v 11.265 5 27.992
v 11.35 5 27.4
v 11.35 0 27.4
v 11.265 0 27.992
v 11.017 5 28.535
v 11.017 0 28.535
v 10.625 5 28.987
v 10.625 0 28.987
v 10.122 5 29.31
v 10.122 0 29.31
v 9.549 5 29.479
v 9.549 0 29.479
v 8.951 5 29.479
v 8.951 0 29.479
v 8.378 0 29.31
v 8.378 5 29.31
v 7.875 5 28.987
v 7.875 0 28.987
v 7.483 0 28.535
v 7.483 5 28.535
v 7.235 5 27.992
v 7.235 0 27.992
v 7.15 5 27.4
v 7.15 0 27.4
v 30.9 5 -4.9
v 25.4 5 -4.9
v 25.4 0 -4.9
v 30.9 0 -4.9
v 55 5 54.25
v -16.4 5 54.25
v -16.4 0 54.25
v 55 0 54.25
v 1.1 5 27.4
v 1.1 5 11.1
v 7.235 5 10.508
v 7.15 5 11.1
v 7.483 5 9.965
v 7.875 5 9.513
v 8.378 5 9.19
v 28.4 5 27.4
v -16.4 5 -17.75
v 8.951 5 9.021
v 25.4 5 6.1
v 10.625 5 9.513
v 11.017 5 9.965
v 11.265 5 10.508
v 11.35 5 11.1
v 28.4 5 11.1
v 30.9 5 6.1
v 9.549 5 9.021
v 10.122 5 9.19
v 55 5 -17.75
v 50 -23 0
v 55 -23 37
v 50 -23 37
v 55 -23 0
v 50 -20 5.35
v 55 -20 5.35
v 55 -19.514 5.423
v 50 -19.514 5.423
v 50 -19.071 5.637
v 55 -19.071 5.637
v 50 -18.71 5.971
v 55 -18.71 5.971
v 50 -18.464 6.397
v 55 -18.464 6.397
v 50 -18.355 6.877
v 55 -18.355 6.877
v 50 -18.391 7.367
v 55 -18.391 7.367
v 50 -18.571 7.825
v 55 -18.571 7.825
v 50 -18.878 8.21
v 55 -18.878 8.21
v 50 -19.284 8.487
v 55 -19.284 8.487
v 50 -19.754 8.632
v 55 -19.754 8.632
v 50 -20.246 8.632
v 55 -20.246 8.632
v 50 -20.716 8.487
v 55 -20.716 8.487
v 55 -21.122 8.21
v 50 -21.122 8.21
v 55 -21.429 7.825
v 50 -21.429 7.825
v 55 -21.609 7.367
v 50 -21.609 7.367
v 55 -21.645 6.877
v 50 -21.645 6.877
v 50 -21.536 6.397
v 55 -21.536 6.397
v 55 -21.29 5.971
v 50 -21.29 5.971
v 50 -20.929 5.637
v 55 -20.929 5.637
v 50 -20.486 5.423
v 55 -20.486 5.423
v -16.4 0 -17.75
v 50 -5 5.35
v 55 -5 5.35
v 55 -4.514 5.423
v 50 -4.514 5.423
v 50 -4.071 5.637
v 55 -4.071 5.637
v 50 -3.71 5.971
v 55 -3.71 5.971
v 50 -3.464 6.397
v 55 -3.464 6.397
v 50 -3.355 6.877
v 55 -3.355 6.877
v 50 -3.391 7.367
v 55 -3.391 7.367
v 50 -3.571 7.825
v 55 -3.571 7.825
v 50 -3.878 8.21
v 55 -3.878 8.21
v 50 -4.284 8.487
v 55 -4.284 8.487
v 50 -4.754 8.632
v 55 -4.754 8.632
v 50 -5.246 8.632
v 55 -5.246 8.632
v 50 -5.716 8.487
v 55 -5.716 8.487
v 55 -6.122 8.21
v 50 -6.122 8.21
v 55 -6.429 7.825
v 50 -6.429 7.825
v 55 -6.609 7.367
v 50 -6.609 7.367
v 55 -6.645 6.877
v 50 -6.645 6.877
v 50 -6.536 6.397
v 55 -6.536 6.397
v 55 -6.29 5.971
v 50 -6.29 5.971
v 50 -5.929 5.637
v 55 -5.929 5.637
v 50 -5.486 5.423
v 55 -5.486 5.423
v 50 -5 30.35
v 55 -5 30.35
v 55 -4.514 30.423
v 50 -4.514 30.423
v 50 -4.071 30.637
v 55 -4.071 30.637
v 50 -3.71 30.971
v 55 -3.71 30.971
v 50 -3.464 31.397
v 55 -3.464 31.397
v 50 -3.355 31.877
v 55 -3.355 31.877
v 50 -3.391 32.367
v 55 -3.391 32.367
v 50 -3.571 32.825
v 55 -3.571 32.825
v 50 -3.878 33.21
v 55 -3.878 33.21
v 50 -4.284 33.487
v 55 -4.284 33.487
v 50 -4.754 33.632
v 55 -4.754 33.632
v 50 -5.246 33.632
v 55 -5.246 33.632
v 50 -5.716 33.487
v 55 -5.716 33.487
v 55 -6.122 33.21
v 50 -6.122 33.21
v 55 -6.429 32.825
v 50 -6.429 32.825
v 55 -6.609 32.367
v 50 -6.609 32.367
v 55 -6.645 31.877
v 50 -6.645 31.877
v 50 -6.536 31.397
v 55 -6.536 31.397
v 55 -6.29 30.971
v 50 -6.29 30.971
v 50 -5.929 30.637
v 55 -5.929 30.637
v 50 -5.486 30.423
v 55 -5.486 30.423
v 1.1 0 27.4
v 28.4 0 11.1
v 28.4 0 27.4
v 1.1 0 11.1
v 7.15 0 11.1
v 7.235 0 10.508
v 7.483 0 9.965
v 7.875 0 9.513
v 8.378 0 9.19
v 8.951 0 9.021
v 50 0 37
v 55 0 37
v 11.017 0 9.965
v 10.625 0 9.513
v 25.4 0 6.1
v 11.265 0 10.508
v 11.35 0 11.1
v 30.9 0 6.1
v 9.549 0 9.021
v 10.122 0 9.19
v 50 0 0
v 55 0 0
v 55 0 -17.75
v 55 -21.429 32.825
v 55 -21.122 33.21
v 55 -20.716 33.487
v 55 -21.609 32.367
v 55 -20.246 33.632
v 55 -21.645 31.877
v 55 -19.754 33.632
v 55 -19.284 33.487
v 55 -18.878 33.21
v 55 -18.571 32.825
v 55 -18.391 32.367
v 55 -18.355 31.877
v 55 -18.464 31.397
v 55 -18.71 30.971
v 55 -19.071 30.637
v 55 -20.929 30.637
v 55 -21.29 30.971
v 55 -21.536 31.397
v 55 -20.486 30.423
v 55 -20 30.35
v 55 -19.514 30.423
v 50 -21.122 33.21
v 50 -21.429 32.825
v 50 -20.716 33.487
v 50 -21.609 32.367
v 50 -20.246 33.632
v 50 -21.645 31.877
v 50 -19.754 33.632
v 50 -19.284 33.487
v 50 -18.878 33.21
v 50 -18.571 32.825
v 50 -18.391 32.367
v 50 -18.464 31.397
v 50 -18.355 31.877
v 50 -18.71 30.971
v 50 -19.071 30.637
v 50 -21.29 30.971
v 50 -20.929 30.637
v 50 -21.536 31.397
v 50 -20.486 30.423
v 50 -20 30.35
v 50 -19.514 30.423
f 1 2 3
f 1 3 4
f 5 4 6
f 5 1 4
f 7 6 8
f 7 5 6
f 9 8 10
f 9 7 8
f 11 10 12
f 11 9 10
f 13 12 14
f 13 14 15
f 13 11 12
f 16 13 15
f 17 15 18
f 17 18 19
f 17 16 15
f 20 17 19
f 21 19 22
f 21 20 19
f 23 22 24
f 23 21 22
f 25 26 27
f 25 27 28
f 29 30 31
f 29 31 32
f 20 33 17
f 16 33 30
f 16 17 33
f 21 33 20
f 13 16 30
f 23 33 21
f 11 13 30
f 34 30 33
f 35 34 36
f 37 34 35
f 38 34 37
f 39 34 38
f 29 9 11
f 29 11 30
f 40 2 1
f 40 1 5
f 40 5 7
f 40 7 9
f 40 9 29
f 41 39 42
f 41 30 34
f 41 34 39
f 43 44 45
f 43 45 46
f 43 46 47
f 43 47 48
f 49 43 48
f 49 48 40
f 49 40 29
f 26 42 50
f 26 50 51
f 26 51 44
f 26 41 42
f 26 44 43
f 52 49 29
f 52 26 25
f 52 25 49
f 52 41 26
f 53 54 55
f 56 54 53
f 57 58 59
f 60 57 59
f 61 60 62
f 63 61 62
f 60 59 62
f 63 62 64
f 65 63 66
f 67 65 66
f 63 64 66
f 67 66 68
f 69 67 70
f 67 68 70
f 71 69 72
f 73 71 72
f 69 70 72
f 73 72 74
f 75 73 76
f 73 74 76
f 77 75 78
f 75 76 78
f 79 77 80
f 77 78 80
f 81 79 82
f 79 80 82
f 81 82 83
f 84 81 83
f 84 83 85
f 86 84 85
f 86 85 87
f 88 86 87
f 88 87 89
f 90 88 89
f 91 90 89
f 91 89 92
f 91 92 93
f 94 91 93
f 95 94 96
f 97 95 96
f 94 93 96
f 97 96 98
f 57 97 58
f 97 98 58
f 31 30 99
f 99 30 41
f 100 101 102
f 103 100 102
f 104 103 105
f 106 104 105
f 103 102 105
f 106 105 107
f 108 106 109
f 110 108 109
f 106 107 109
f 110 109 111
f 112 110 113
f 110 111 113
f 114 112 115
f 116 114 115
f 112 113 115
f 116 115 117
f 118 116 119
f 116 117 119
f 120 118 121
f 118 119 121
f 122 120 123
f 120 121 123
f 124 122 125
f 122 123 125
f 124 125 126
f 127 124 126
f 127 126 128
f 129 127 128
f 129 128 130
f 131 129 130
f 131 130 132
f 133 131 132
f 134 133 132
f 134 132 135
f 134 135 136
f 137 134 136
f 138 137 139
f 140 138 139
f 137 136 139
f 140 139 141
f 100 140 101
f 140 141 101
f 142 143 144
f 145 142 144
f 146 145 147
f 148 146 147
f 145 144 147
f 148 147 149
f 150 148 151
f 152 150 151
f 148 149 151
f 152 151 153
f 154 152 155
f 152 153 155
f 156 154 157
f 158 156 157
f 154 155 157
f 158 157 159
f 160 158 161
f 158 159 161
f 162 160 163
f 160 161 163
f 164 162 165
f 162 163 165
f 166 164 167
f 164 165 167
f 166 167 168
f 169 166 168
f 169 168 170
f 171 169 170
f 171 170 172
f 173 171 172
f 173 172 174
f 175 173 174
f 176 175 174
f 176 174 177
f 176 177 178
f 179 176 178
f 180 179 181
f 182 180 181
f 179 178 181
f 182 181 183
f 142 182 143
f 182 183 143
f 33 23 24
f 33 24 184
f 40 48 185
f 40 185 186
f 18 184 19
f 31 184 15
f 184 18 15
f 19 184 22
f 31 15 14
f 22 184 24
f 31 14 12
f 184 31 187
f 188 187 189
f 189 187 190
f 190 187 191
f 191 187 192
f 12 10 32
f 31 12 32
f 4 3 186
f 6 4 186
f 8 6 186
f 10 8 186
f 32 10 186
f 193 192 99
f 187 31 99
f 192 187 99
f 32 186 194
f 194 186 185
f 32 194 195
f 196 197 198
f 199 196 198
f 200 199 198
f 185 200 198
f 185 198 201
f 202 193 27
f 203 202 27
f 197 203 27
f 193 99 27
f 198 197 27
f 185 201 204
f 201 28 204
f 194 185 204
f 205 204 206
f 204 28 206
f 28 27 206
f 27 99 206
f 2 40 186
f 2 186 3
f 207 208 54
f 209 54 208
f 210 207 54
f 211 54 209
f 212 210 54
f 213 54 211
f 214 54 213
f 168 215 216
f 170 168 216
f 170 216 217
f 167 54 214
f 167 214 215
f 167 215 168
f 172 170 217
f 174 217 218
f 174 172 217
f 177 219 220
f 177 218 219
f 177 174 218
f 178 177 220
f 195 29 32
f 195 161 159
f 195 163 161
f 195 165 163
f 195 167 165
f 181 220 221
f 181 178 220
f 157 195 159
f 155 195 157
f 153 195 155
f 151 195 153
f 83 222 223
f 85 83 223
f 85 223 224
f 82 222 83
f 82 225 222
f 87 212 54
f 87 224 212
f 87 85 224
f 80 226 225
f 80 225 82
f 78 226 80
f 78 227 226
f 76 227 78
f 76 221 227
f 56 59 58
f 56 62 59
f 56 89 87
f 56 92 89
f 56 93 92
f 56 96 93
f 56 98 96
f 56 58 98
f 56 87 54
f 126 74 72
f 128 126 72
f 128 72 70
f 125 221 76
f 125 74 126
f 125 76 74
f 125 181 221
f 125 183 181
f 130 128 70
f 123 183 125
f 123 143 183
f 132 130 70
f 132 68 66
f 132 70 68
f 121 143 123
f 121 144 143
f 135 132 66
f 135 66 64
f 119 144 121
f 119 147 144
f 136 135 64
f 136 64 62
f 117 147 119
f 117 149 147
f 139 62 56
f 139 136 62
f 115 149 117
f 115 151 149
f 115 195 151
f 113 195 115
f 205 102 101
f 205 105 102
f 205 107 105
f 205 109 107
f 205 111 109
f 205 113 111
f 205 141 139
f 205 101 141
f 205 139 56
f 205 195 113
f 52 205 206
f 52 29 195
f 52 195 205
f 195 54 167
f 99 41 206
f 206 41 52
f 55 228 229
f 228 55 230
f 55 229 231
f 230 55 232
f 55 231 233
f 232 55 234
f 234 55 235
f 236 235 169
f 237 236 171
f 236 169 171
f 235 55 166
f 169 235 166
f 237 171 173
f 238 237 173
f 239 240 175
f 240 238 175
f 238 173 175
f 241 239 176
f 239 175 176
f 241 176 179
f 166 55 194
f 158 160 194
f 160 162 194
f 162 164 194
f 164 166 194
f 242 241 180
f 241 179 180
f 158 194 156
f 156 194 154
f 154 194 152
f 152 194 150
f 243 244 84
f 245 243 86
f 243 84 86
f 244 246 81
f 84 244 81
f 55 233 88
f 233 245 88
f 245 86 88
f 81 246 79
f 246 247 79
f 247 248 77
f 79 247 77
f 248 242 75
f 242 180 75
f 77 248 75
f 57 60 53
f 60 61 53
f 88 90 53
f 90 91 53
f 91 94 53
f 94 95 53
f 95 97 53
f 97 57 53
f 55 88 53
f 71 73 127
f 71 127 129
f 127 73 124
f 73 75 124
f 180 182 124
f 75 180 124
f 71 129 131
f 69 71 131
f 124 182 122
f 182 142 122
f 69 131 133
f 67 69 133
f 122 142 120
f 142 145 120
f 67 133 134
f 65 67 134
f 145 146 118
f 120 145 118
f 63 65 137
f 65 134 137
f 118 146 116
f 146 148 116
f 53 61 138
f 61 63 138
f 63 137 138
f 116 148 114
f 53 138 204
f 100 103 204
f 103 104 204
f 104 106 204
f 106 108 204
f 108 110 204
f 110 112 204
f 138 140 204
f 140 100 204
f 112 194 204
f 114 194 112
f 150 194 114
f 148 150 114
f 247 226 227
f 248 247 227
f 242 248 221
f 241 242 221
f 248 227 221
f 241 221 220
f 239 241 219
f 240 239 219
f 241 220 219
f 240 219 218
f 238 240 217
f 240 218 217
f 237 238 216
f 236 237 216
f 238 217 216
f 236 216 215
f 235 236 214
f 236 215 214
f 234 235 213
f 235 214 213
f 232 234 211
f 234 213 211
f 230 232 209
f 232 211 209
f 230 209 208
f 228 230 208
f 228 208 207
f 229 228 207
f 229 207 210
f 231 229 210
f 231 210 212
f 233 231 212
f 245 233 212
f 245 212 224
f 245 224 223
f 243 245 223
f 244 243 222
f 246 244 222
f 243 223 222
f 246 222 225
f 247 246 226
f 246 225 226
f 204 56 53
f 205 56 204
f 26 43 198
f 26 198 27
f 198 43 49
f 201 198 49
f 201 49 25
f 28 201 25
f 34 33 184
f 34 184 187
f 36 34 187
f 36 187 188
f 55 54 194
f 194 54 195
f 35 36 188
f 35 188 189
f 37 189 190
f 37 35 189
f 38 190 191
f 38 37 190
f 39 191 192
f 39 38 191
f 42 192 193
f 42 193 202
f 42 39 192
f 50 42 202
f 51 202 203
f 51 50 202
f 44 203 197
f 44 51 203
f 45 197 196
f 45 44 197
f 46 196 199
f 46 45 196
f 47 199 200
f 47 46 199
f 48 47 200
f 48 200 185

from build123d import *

# Parameters (mm, degrees)
SKETCH_1_W          = 55
SKETCH_1_H          = 70
EXTRUDE_1_DEPTH     = 5
SKETCH_2_W          = 37
SKETCH_2_H          = 28
EXTRUDE_2_DEPTH     = 5
SKETCH_3_R          = 1.65
CUT_EXTRUDE_1_DEPTH = 5
SKETCH_5_W          = 55
SKETCH_5_H          = 15.75
EXTRUDE_3_DEPTH     = 5
SKETCH_6_W          = 55
SKETCH_6_H          = 15.75
CUT_EXTRUDE_2_DEPTH = 5
CUT_EXTRUDE_3_DEPTH = 5
SKETCH_9_W          = 5.5
SKETCH_9_H          = 11
CUT_EXTRUDE_4_DEPTH = 8
SKETCH_11_W         = 16.4
SKETCH_11_H         = 70
EXTRUDE_4_DEPTH     = 5
SKETCH_12_W         = 71.4
SKETCH_12_H         = 2
EXTRUDE_5_DEPTH     = 5


with BuildPart() as part:
    # 草图1 → 凸台-拉伸1 (new body)
    with BuildSketch(Plane(origin=(0, 0, 0), x_dir=(1, 0, 0), z_dir=(0, 1, 0))):
        with Locations((27.5, -35)):
            Rectangle(SKETCH_1_W, SKETCH_1_H)
    extrude(amount=EXTRUDE_1_DEPTH)

    # 草图2 → 凸台-拉伸2 (add)
    with BuildSketch(Plane(origin=(55, 0, 0), x_dir=(0, 0, -1), z_dir=(1, 0, 0))):
        with Locations((-18.5, -9)):
            Rectangle(SKETCH_2_W, SKETCH_2_H)
    extrude(amount=-EXTRUDE_2_DEPTH)

    # 草图3 → 切除-拉伸1 (cut)
    with BuildSketch(Plane(origin=(55, 0, 0), x_dir=(0, 0, -1), z_dir=(1, 0, 0))):
        with Locations((-7, -5)):
            Circle(SKETCH_3_R)
        with Locations((-32, -5)):
            Circle(SKETCH_3_R)
        with Locations((-32, -20)):
            Circle(SKETCH_3_R)
        with Locations((-7, -20)):
            Circle(SKETCH_3_R)
    extrude(amount=-CUT_EXTRUDE_1_DEPTH, mode=Mode.SUBTRACT)

    # 草图5 → 凸台-拉伸3 (add)
    with BuildSketch(Plane(origin=(0, 5, 0), x_dir=(1, 0, 0), z_dir=(0, 1, 0))):
        with Locations((27.5, 7.875)):
            Rectangle(SKETCH_5_W, SKETCH_5_H)
    extrude(amount=-EXTRUDE_3_DEPTH)

    # 草图6 → 切除-拉伸2 (cut)
    with BuildSketch(Plane(origin=(0, 5, 0), x_dir=(1, 0, 0), z_dir=(0, 1, 0))):
        with Locations((27.5, -62.125)):
            Rectangle(SKETCH_6_W, SKETCH_6_H)
    extrude(amount=-CUT_EXTRUDE_2_DEPTH, mode=Mode.SUBTRACT)

    # 草图8 → 切除-拉伸3 (cut)
    with BuildSketch(Plane(origin=(0, 5, 0), x_dir=(1, 0, 0), z_dir=(0, 1, 0))):
        with BuildLine():
            Line((17.4, -11.1), (28.4, -11.1))
            Line((28.4, -11.1), (28.4, -27.4))
            Line((28.4, -27.4), (17.4, -27.4))
            Line((17.4, -27.4), (11.35, -27.4))
            ThreePointArc((11.35, -27.4), (9.25, -29.5), (7.15, -27.4))
            Line((7.15, -27.4), (1.1, -27.4))
            Line((1.1, -27.4), (1.1, -11.1))
            Line((1.1, -11.1), (7.15, -11.1))
            ThreePointArc((7.15, -11.1), (9.25, -9), (11.35, -11.1))
            Line((11.35, -11.1), (17.4, -11.1))
        make_face()
    extrude(amount=-CUT_EXTRUDE_3_DEPTH, mode=Mode.SUBTRACT)

    # 草图9 → 切除-拉伸4 (cut)
    with BuildSketch(Plane(origin=(0, 5, 0), x_dir=(1, 0, 0), z_dir=(0, 1, 0))):
        with Locations((28.15, -0.6)):
            Rectangle(SKETCH_9_W, SKETCH_9_H)
    extrude(amount=-CUT_EXTRUDE_4_DEPTH, mode=Mode.SUBTRACT)

    # 草图11 → 凸台-拉伸4 (add)
    with BuildSketch(Plane(origin=(0, 5, 0), x_dir=(1, 0, 0), z_dir=(0, 1, 0))):
        with Locations((-8.2, -19.25)):
            Rectangle(SKETCH_11_W, SKETCH_11_H)
    extrude(amount=-EXTRUDE_4_DEPTH)

    # 草图12 → 凸台-拉伸5 (add)
    with BuildSketch(Plane(origin=(0, 5, 0), x_dir=(1, 0, 0), z_dir=(0, 1, 0))):
        with Locations((19.3, 16.75)):
            Rectangle(SKETCH_12_W, SKETCH_12_H)
    extrude(amount=-EXTRUDE_5_DEPTH)


solid = part.part
